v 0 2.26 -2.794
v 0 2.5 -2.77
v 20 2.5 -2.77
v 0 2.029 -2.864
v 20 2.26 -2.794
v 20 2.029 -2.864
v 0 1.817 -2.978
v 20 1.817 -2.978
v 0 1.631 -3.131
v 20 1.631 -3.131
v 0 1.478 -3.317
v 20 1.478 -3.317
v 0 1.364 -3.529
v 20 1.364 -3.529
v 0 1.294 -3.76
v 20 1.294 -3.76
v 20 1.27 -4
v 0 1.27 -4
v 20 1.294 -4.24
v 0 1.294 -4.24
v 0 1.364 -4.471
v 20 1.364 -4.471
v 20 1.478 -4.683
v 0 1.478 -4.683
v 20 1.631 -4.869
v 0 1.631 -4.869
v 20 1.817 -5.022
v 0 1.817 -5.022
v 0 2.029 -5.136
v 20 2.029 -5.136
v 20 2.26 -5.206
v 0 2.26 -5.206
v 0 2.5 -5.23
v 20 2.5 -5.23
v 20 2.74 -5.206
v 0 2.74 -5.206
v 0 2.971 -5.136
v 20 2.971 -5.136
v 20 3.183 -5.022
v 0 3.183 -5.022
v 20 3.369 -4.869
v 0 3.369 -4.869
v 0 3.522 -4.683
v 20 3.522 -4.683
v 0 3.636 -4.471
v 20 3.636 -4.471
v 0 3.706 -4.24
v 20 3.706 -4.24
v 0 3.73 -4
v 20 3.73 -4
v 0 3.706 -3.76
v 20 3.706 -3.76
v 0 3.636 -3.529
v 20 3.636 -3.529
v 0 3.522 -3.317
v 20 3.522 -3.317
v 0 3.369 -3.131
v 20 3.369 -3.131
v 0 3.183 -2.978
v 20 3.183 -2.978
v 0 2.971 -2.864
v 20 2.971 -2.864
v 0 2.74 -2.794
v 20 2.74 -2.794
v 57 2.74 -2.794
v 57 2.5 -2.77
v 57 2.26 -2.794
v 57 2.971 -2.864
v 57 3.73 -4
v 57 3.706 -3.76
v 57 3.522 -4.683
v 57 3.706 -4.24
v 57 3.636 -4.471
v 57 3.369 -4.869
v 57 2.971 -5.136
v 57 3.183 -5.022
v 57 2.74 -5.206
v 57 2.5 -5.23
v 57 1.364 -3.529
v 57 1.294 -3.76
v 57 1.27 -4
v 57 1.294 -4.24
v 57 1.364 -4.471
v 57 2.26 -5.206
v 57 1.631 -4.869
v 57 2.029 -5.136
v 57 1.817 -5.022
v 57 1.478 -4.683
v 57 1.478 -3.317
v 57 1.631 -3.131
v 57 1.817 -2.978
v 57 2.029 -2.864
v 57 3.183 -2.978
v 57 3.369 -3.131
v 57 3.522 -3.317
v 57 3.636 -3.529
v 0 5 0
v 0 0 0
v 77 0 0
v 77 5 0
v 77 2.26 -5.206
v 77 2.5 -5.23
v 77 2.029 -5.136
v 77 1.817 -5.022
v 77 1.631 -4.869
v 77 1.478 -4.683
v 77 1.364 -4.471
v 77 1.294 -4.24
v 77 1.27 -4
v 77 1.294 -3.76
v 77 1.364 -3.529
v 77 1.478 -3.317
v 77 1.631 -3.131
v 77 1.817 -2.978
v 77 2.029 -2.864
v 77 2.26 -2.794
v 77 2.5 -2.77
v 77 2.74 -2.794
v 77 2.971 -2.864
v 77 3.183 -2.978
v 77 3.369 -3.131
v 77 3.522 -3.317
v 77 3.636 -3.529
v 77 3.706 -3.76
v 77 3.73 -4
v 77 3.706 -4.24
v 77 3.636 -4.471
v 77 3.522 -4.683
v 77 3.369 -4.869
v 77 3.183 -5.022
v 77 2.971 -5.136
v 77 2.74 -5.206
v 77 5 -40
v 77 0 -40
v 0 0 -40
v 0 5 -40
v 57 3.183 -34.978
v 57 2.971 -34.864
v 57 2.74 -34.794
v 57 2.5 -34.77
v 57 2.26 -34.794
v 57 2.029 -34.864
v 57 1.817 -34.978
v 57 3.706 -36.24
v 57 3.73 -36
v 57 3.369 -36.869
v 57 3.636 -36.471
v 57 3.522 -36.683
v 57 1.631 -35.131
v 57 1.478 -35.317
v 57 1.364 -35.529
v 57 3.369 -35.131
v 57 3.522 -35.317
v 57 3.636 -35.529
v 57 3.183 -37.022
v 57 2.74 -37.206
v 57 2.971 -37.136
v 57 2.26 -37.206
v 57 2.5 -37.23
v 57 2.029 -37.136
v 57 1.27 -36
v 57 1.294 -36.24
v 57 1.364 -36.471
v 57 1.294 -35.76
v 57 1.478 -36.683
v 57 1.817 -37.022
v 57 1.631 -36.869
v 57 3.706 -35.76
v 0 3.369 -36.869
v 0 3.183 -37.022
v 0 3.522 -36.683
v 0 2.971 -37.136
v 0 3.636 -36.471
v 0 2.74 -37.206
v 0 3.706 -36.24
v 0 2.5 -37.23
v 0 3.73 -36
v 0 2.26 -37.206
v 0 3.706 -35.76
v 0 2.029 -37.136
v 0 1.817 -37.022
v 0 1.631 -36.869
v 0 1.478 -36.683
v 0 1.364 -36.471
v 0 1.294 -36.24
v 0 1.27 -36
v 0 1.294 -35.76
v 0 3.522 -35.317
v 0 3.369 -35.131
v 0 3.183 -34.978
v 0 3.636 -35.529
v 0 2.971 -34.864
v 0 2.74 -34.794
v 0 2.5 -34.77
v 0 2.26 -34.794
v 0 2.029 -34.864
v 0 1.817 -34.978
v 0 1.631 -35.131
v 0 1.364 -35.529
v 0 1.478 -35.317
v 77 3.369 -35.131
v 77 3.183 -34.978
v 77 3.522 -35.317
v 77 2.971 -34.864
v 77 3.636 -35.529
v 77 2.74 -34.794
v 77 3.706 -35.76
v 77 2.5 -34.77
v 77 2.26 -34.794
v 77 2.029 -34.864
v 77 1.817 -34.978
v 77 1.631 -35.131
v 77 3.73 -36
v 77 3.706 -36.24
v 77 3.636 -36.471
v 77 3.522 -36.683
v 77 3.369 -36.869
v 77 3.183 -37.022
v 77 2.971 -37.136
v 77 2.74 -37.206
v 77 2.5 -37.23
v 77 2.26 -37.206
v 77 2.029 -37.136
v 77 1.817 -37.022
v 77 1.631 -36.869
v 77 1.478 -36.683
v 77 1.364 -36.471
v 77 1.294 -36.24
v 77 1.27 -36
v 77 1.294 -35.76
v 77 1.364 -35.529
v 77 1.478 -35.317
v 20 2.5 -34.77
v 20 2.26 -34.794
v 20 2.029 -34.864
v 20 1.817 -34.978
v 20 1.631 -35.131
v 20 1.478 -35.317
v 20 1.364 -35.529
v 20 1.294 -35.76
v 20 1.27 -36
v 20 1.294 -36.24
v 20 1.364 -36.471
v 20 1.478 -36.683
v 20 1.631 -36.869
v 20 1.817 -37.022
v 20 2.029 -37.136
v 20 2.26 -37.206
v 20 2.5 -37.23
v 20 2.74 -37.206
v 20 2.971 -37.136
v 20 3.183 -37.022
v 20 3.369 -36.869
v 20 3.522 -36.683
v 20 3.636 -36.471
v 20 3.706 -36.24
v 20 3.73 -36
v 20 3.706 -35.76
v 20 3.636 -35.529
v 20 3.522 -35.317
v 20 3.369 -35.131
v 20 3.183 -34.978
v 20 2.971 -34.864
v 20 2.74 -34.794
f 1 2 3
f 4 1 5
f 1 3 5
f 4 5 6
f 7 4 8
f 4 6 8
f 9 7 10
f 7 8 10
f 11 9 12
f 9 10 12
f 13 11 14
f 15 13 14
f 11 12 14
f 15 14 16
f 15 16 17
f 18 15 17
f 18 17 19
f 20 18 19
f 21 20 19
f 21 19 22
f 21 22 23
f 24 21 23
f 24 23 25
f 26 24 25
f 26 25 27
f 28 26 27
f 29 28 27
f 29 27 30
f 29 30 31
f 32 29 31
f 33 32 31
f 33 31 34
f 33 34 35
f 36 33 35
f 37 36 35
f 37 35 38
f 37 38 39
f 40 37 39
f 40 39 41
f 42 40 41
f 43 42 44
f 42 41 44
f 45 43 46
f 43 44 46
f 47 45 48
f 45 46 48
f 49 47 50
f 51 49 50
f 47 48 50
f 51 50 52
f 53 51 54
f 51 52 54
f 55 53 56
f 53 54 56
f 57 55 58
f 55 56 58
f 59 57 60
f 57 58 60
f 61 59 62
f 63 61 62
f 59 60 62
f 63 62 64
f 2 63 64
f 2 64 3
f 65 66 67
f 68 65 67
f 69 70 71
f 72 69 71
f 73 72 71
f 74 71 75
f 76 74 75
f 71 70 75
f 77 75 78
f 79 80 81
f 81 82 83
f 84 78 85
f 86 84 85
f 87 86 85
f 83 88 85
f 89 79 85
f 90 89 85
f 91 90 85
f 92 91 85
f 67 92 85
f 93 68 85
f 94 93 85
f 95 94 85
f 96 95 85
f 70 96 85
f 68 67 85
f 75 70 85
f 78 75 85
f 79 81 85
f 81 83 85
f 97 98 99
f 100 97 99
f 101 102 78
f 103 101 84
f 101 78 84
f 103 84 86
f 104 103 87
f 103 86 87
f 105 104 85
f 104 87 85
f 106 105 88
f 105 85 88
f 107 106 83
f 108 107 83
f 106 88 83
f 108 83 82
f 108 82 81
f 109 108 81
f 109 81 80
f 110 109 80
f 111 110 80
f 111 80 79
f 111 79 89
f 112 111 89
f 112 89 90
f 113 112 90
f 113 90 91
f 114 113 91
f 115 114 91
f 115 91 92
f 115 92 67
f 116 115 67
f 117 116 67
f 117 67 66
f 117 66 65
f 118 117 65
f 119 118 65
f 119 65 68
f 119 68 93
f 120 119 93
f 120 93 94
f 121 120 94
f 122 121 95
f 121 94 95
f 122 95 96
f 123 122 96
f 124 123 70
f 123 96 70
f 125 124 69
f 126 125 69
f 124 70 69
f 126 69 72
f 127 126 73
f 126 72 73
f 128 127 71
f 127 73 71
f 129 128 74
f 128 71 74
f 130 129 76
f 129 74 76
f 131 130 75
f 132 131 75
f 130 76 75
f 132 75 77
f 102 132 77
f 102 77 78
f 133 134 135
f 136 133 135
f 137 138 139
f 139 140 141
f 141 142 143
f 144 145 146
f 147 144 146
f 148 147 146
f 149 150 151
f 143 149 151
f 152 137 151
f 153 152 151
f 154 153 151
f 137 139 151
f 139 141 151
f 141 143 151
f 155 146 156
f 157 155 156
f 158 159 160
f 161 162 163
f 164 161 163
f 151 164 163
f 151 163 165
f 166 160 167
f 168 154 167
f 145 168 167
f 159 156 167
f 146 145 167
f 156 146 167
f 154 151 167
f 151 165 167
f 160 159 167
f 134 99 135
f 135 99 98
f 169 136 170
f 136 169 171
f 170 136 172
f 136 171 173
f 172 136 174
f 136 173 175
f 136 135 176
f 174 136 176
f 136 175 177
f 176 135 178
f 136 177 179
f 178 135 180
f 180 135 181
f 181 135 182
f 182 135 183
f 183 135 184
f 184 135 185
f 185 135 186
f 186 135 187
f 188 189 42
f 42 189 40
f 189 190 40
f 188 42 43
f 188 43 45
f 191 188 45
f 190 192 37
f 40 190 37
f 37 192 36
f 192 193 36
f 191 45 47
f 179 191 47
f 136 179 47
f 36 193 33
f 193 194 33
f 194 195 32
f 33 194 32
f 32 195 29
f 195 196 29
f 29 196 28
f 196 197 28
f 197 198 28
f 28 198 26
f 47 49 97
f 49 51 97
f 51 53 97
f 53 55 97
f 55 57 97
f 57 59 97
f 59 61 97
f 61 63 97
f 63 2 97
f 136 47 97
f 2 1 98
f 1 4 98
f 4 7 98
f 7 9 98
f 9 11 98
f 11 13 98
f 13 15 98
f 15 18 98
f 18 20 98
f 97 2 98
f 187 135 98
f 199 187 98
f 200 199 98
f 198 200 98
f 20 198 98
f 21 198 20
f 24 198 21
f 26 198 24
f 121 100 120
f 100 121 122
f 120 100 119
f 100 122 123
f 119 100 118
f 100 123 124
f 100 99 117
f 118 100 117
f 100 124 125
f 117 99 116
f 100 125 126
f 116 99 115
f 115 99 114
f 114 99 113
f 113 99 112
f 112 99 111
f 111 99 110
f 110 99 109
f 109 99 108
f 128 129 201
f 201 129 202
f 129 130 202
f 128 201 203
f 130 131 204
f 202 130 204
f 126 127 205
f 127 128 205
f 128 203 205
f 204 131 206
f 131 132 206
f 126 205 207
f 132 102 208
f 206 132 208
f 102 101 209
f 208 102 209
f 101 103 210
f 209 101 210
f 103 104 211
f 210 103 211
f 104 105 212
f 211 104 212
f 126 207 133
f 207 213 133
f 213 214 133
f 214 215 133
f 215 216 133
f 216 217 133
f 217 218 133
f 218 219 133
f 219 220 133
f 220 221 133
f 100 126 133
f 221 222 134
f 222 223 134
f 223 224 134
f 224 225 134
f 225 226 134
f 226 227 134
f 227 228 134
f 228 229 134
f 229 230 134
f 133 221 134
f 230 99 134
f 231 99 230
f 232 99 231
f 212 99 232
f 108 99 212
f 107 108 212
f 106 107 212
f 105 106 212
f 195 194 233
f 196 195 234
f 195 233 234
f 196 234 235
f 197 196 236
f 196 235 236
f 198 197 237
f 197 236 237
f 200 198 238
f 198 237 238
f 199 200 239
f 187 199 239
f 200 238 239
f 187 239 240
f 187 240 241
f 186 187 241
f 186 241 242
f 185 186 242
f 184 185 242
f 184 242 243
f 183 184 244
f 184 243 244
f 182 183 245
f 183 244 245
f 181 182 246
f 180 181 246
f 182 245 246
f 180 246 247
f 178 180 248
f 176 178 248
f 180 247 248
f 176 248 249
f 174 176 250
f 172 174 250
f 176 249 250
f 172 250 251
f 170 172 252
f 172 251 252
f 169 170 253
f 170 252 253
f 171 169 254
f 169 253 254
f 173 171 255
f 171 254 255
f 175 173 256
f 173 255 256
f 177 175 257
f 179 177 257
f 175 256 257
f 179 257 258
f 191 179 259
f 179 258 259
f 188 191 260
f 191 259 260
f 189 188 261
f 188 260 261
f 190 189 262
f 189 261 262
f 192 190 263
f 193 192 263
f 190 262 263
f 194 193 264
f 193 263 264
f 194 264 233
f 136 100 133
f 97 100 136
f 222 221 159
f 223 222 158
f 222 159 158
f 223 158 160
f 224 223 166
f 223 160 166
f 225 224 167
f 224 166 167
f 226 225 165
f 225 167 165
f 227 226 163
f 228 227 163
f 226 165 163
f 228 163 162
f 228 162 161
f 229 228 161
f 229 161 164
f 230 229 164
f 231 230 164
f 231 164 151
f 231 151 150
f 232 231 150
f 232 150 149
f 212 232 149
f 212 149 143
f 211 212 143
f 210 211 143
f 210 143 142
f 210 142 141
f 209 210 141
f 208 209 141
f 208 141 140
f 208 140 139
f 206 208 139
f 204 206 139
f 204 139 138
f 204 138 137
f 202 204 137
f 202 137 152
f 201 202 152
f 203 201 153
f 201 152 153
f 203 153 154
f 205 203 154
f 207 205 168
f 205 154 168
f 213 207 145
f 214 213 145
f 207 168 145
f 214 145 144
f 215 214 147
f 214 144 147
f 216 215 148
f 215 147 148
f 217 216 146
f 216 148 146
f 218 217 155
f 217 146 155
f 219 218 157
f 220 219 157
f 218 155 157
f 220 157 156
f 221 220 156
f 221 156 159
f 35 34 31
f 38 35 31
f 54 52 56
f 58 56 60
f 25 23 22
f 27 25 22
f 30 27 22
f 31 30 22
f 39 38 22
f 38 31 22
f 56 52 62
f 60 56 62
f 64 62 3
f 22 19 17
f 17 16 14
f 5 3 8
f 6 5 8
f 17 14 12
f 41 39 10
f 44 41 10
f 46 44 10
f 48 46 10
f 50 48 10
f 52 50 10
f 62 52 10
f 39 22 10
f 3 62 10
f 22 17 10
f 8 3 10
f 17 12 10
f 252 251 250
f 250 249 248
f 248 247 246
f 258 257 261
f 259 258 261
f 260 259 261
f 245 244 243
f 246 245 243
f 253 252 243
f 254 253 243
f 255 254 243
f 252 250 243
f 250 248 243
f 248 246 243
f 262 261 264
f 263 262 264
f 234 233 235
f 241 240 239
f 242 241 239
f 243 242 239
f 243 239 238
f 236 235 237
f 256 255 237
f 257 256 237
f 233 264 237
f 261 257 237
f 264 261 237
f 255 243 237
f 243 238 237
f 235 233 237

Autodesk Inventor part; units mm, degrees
ref_plane "YZ Plane" through (0, 0, 0) normal (1, 0, 0) x (0, 1, 0)
ref_plane "XZ Plane" through (0, 0, 0) normal (0, 1, 0) x (-1, 0, 0)
ref_plane "XY Plane" through (0, 0, 0) normal (0, 0, 1) x (1, 0, 0)
sketch "スケッチ2" plane through (0, 0, 0) normal (0, 1, 0) x (-1, 0, 0)
  line L0 (0, 0) -> (-77, 0)
  line L1 (-77, 0) -> (-77, -40)
  line L2 (-77, -40) -> (0, -40)
  line L3 (0, -40) -> (0, 0)
  dimension "d0" = 77
  dimension "d1" = 40
extrude "押し出し1" add sketch "スケッチ2" along normal blind 5
sketch "スケッチ4" plane through (0, 0, -40) normal (-1, 0, 0) x (0, 0, 1)
  line L0 (0, 0) -> (0, 5) construction
  line L1 (0, 2.5) -> (40, 2.5) construction
  line L2 (40, 0) -> (40, 5) construction
  point P0 (4, 2.5)
  point P1 (36, 2.5)
  dimension "d4" = 4
  dimension "d5" = 4
hole "穴1" at (0, 2.5, -36) at (0, 2.5, -4) direction (1, 0, 0) diameter 2.459 depth 20 thread size "M3x0.5" class "6H" standard "ISO Metric profile"
sketch "スケッチ5" plane through (77, 0, 0) normal (1, 0, 0) x (0, 0, -1)
  line L0 (0, 0) -> (0, 5) construction
  line L1 (0, 2.5) -> (39.9198, 2.5) construction
  circle A0 centre (4, 2.5) radius 1.2295 construction
  circle A1 centre (36, 2.5) radius 1.2295 projected
hole "穴2" at (77, 2.5, -4) at (77, 2.5, -36) direction (-1, 0, 0) diameter 2.459 depth 20 thread size "M3x0.5" class "6H" standard "ISO Metric profile"
properties part number "shoulder1_verticval_plate"
